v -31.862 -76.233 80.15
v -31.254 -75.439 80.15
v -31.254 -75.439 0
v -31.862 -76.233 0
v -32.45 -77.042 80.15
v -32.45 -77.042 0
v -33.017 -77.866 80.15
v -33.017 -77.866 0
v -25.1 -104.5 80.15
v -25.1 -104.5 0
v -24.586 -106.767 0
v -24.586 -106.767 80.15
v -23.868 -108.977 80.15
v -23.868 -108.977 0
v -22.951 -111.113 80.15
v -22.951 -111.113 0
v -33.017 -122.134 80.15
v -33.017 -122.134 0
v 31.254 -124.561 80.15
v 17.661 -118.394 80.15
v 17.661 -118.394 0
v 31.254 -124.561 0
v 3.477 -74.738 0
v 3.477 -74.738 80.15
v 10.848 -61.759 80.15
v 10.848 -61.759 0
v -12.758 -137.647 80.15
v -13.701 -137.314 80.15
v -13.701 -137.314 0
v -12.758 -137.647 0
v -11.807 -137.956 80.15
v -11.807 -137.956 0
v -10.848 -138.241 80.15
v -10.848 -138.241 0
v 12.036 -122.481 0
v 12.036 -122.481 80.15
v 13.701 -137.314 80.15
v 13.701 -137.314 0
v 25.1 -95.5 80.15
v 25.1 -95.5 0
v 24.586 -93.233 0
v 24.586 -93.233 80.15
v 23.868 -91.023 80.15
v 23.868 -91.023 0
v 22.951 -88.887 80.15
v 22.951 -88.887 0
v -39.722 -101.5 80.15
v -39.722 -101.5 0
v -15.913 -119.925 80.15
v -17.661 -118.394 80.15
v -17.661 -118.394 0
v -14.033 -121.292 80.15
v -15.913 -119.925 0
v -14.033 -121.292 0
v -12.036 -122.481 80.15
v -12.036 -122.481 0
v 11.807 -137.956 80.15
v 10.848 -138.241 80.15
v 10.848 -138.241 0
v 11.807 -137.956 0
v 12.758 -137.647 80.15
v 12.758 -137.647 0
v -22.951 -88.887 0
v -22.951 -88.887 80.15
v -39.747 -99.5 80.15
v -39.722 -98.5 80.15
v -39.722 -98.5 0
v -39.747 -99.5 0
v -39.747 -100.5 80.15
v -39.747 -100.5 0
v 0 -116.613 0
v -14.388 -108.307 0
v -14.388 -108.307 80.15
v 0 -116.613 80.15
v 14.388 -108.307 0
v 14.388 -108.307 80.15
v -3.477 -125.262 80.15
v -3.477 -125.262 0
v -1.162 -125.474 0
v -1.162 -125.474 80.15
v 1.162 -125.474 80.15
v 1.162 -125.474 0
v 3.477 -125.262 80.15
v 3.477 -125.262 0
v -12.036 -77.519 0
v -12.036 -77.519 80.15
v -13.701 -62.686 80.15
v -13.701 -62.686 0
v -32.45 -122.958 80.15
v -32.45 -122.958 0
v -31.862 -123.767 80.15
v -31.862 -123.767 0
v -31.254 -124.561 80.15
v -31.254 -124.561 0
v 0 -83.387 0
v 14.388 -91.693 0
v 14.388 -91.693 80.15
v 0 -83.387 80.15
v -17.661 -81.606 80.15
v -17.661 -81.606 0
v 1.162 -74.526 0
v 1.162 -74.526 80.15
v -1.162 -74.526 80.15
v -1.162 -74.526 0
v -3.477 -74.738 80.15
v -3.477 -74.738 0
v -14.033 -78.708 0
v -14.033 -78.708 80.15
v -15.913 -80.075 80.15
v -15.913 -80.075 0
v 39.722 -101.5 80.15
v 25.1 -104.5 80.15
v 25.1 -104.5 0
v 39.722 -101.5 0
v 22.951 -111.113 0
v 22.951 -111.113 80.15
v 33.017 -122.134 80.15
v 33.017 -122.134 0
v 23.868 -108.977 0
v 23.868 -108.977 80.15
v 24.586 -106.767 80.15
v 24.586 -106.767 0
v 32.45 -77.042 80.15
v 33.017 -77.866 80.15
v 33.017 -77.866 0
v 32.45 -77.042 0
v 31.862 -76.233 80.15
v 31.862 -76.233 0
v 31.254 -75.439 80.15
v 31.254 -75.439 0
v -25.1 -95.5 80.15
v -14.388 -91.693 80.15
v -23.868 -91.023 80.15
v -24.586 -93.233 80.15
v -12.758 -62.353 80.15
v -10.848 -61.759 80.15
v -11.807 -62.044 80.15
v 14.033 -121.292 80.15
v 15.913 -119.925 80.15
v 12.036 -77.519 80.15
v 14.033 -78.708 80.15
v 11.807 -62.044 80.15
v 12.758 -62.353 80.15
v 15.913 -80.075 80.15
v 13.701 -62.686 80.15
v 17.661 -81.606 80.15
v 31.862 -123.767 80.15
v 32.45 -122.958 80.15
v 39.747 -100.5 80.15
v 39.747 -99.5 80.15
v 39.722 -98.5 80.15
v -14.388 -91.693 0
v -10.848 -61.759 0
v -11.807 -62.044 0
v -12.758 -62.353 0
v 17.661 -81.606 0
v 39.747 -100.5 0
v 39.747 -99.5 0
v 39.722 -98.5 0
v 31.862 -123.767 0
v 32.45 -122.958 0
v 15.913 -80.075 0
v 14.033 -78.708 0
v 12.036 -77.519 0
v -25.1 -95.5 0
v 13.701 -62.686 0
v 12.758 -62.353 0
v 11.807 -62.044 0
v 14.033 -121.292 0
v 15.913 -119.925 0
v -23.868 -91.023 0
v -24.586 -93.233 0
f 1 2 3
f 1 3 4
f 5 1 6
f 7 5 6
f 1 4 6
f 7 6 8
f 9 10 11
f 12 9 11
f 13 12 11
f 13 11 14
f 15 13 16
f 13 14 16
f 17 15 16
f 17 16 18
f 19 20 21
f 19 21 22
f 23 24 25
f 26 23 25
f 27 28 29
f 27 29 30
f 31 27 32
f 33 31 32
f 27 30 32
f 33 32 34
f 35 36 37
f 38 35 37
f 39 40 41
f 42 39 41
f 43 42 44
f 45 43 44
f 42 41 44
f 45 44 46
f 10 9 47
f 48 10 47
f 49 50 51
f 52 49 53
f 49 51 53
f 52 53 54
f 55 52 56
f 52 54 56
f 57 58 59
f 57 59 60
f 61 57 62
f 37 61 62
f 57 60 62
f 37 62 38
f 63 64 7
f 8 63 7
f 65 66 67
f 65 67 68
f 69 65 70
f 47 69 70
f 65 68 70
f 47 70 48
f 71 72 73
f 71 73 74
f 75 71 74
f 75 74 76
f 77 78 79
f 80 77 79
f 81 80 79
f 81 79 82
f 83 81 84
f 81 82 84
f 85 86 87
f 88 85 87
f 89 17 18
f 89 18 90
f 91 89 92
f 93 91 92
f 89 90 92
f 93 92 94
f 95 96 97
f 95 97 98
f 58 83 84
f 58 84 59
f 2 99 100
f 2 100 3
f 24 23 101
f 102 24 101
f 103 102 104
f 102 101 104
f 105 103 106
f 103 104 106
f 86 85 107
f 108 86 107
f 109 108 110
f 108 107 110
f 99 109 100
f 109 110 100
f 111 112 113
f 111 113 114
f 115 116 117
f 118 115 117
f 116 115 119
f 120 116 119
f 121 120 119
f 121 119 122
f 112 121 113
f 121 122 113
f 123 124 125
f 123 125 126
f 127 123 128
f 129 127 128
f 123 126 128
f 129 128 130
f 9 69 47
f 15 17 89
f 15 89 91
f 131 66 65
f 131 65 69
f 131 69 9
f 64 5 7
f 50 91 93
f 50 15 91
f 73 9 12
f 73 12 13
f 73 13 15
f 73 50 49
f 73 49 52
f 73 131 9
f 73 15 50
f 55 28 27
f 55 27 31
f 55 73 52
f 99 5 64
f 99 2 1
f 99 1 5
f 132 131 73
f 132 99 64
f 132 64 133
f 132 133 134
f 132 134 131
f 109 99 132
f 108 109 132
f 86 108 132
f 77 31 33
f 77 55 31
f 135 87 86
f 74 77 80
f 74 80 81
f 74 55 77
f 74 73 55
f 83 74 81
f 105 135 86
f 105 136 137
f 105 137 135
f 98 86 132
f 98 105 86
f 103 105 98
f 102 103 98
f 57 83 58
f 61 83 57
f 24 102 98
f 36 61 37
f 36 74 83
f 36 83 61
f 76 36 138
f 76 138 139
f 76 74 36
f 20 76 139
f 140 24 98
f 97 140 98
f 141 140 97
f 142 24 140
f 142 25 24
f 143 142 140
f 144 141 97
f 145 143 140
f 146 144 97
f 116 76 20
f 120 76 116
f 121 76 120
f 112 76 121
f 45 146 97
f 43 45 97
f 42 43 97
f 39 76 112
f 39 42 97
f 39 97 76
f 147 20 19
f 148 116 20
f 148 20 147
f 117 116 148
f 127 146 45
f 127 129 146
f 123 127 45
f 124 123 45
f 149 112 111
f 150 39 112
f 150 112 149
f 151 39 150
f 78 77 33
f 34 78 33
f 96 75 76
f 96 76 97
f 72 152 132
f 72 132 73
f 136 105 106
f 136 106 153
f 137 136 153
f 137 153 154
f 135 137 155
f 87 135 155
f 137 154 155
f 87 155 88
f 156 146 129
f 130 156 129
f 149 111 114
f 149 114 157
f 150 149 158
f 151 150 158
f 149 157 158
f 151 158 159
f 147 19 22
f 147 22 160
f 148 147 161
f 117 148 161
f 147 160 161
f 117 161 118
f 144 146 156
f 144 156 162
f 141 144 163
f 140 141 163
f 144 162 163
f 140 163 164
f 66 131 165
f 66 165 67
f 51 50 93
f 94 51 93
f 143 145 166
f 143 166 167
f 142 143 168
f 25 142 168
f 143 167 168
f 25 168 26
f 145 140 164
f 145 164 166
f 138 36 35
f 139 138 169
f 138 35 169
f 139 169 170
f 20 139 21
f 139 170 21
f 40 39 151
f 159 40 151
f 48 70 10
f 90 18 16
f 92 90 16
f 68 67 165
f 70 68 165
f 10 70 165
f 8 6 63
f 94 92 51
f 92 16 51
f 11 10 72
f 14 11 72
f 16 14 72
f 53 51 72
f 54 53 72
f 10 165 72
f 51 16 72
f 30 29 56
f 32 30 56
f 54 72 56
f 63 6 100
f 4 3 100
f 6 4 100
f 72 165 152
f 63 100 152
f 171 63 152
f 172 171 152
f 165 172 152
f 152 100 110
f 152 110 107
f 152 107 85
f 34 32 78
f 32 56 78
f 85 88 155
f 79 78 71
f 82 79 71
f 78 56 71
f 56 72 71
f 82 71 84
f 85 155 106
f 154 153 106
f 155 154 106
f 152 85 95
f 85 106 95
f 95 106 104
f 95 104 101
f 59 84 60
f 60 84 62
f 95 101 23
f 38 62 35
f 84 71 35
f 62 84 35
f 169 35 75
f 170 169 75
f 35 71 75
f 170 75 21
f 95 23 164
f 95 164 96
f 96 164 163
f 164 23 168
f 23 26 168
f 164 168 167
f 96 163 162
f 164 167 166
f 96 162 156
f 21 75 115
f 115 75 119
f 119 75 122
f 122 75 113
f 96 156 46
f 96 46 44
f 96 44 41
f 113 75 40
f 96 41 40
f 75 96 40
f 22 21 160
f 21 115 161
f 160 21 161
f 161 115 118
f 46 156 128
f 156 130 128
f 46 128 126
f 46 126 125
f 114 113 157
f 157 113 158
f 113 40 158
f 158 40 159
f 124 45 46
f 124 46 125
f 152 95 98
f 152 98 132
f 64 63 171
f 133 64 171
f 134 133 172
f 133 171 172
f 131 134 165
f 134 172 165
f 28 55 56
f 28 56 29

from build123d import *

# Parameters (mm, degrees)
SKETCH002_R        = 25.5
PAD001_DEPTH       = 80.15
PAD006_DEPTH       = 80.15
POLARPATTERN_COUNT = 10
POCKET_DEPTH       = 80.151


with BuildPart() as part:
    # Sketch002 → Pad001 (new body)
    with BuildSketch(Plane.XY):
        Circle(SKETCH002_R)
    extrude(amount=PAD001_DEPTH)

    # Sketch → Pad006 (join)
    with BuildSketch(Plane.XY):
        with BuildLine():
            ThreePointArc((39.721688, -1.5), (39.75, 0), (39.721688, 1.5))
            Line((25.099801, 4.5), (39.721688, 1.5))
            Line((25.099801, 4.5), (17, 0))
            Line((17, 0), (25.099801, -4.5))
            Line((25.099801, -4.5), (39.721688, -1.5))
        make_face()
    pad006 = extrude(amount=PAD006_DEPTH)

    # PolarPattern: Pad006 ×10 about axis
    polarpattern_axis = Axis((0, 0, 0), (0, 0, 1))
    for i in range(1, POLARPATTERN_COUNT):
        add(pad006.rotate(polarpattern_axis, i * 360 / POLARPATTERN_COUNT))

    # Sketch001 → Pocket (cut, through all)
    with BuildSketch(Plane.XY):
        Polygon((14.3875, 8.306627), (0, 16.613254), (-14.3875, 8.306627), (-14.3875, -8.306627), (0, -16.613254), (14.3875, -8.306627), align=None)
    extrude(amount=POCKET_DEPTH, mode=Mode.SUBTRACT)


with BuildPart() as part_1:
    # Body027 placement: moved
    add(part.part.moved(Location((0, -100, 0))))


solid = part_1.part
